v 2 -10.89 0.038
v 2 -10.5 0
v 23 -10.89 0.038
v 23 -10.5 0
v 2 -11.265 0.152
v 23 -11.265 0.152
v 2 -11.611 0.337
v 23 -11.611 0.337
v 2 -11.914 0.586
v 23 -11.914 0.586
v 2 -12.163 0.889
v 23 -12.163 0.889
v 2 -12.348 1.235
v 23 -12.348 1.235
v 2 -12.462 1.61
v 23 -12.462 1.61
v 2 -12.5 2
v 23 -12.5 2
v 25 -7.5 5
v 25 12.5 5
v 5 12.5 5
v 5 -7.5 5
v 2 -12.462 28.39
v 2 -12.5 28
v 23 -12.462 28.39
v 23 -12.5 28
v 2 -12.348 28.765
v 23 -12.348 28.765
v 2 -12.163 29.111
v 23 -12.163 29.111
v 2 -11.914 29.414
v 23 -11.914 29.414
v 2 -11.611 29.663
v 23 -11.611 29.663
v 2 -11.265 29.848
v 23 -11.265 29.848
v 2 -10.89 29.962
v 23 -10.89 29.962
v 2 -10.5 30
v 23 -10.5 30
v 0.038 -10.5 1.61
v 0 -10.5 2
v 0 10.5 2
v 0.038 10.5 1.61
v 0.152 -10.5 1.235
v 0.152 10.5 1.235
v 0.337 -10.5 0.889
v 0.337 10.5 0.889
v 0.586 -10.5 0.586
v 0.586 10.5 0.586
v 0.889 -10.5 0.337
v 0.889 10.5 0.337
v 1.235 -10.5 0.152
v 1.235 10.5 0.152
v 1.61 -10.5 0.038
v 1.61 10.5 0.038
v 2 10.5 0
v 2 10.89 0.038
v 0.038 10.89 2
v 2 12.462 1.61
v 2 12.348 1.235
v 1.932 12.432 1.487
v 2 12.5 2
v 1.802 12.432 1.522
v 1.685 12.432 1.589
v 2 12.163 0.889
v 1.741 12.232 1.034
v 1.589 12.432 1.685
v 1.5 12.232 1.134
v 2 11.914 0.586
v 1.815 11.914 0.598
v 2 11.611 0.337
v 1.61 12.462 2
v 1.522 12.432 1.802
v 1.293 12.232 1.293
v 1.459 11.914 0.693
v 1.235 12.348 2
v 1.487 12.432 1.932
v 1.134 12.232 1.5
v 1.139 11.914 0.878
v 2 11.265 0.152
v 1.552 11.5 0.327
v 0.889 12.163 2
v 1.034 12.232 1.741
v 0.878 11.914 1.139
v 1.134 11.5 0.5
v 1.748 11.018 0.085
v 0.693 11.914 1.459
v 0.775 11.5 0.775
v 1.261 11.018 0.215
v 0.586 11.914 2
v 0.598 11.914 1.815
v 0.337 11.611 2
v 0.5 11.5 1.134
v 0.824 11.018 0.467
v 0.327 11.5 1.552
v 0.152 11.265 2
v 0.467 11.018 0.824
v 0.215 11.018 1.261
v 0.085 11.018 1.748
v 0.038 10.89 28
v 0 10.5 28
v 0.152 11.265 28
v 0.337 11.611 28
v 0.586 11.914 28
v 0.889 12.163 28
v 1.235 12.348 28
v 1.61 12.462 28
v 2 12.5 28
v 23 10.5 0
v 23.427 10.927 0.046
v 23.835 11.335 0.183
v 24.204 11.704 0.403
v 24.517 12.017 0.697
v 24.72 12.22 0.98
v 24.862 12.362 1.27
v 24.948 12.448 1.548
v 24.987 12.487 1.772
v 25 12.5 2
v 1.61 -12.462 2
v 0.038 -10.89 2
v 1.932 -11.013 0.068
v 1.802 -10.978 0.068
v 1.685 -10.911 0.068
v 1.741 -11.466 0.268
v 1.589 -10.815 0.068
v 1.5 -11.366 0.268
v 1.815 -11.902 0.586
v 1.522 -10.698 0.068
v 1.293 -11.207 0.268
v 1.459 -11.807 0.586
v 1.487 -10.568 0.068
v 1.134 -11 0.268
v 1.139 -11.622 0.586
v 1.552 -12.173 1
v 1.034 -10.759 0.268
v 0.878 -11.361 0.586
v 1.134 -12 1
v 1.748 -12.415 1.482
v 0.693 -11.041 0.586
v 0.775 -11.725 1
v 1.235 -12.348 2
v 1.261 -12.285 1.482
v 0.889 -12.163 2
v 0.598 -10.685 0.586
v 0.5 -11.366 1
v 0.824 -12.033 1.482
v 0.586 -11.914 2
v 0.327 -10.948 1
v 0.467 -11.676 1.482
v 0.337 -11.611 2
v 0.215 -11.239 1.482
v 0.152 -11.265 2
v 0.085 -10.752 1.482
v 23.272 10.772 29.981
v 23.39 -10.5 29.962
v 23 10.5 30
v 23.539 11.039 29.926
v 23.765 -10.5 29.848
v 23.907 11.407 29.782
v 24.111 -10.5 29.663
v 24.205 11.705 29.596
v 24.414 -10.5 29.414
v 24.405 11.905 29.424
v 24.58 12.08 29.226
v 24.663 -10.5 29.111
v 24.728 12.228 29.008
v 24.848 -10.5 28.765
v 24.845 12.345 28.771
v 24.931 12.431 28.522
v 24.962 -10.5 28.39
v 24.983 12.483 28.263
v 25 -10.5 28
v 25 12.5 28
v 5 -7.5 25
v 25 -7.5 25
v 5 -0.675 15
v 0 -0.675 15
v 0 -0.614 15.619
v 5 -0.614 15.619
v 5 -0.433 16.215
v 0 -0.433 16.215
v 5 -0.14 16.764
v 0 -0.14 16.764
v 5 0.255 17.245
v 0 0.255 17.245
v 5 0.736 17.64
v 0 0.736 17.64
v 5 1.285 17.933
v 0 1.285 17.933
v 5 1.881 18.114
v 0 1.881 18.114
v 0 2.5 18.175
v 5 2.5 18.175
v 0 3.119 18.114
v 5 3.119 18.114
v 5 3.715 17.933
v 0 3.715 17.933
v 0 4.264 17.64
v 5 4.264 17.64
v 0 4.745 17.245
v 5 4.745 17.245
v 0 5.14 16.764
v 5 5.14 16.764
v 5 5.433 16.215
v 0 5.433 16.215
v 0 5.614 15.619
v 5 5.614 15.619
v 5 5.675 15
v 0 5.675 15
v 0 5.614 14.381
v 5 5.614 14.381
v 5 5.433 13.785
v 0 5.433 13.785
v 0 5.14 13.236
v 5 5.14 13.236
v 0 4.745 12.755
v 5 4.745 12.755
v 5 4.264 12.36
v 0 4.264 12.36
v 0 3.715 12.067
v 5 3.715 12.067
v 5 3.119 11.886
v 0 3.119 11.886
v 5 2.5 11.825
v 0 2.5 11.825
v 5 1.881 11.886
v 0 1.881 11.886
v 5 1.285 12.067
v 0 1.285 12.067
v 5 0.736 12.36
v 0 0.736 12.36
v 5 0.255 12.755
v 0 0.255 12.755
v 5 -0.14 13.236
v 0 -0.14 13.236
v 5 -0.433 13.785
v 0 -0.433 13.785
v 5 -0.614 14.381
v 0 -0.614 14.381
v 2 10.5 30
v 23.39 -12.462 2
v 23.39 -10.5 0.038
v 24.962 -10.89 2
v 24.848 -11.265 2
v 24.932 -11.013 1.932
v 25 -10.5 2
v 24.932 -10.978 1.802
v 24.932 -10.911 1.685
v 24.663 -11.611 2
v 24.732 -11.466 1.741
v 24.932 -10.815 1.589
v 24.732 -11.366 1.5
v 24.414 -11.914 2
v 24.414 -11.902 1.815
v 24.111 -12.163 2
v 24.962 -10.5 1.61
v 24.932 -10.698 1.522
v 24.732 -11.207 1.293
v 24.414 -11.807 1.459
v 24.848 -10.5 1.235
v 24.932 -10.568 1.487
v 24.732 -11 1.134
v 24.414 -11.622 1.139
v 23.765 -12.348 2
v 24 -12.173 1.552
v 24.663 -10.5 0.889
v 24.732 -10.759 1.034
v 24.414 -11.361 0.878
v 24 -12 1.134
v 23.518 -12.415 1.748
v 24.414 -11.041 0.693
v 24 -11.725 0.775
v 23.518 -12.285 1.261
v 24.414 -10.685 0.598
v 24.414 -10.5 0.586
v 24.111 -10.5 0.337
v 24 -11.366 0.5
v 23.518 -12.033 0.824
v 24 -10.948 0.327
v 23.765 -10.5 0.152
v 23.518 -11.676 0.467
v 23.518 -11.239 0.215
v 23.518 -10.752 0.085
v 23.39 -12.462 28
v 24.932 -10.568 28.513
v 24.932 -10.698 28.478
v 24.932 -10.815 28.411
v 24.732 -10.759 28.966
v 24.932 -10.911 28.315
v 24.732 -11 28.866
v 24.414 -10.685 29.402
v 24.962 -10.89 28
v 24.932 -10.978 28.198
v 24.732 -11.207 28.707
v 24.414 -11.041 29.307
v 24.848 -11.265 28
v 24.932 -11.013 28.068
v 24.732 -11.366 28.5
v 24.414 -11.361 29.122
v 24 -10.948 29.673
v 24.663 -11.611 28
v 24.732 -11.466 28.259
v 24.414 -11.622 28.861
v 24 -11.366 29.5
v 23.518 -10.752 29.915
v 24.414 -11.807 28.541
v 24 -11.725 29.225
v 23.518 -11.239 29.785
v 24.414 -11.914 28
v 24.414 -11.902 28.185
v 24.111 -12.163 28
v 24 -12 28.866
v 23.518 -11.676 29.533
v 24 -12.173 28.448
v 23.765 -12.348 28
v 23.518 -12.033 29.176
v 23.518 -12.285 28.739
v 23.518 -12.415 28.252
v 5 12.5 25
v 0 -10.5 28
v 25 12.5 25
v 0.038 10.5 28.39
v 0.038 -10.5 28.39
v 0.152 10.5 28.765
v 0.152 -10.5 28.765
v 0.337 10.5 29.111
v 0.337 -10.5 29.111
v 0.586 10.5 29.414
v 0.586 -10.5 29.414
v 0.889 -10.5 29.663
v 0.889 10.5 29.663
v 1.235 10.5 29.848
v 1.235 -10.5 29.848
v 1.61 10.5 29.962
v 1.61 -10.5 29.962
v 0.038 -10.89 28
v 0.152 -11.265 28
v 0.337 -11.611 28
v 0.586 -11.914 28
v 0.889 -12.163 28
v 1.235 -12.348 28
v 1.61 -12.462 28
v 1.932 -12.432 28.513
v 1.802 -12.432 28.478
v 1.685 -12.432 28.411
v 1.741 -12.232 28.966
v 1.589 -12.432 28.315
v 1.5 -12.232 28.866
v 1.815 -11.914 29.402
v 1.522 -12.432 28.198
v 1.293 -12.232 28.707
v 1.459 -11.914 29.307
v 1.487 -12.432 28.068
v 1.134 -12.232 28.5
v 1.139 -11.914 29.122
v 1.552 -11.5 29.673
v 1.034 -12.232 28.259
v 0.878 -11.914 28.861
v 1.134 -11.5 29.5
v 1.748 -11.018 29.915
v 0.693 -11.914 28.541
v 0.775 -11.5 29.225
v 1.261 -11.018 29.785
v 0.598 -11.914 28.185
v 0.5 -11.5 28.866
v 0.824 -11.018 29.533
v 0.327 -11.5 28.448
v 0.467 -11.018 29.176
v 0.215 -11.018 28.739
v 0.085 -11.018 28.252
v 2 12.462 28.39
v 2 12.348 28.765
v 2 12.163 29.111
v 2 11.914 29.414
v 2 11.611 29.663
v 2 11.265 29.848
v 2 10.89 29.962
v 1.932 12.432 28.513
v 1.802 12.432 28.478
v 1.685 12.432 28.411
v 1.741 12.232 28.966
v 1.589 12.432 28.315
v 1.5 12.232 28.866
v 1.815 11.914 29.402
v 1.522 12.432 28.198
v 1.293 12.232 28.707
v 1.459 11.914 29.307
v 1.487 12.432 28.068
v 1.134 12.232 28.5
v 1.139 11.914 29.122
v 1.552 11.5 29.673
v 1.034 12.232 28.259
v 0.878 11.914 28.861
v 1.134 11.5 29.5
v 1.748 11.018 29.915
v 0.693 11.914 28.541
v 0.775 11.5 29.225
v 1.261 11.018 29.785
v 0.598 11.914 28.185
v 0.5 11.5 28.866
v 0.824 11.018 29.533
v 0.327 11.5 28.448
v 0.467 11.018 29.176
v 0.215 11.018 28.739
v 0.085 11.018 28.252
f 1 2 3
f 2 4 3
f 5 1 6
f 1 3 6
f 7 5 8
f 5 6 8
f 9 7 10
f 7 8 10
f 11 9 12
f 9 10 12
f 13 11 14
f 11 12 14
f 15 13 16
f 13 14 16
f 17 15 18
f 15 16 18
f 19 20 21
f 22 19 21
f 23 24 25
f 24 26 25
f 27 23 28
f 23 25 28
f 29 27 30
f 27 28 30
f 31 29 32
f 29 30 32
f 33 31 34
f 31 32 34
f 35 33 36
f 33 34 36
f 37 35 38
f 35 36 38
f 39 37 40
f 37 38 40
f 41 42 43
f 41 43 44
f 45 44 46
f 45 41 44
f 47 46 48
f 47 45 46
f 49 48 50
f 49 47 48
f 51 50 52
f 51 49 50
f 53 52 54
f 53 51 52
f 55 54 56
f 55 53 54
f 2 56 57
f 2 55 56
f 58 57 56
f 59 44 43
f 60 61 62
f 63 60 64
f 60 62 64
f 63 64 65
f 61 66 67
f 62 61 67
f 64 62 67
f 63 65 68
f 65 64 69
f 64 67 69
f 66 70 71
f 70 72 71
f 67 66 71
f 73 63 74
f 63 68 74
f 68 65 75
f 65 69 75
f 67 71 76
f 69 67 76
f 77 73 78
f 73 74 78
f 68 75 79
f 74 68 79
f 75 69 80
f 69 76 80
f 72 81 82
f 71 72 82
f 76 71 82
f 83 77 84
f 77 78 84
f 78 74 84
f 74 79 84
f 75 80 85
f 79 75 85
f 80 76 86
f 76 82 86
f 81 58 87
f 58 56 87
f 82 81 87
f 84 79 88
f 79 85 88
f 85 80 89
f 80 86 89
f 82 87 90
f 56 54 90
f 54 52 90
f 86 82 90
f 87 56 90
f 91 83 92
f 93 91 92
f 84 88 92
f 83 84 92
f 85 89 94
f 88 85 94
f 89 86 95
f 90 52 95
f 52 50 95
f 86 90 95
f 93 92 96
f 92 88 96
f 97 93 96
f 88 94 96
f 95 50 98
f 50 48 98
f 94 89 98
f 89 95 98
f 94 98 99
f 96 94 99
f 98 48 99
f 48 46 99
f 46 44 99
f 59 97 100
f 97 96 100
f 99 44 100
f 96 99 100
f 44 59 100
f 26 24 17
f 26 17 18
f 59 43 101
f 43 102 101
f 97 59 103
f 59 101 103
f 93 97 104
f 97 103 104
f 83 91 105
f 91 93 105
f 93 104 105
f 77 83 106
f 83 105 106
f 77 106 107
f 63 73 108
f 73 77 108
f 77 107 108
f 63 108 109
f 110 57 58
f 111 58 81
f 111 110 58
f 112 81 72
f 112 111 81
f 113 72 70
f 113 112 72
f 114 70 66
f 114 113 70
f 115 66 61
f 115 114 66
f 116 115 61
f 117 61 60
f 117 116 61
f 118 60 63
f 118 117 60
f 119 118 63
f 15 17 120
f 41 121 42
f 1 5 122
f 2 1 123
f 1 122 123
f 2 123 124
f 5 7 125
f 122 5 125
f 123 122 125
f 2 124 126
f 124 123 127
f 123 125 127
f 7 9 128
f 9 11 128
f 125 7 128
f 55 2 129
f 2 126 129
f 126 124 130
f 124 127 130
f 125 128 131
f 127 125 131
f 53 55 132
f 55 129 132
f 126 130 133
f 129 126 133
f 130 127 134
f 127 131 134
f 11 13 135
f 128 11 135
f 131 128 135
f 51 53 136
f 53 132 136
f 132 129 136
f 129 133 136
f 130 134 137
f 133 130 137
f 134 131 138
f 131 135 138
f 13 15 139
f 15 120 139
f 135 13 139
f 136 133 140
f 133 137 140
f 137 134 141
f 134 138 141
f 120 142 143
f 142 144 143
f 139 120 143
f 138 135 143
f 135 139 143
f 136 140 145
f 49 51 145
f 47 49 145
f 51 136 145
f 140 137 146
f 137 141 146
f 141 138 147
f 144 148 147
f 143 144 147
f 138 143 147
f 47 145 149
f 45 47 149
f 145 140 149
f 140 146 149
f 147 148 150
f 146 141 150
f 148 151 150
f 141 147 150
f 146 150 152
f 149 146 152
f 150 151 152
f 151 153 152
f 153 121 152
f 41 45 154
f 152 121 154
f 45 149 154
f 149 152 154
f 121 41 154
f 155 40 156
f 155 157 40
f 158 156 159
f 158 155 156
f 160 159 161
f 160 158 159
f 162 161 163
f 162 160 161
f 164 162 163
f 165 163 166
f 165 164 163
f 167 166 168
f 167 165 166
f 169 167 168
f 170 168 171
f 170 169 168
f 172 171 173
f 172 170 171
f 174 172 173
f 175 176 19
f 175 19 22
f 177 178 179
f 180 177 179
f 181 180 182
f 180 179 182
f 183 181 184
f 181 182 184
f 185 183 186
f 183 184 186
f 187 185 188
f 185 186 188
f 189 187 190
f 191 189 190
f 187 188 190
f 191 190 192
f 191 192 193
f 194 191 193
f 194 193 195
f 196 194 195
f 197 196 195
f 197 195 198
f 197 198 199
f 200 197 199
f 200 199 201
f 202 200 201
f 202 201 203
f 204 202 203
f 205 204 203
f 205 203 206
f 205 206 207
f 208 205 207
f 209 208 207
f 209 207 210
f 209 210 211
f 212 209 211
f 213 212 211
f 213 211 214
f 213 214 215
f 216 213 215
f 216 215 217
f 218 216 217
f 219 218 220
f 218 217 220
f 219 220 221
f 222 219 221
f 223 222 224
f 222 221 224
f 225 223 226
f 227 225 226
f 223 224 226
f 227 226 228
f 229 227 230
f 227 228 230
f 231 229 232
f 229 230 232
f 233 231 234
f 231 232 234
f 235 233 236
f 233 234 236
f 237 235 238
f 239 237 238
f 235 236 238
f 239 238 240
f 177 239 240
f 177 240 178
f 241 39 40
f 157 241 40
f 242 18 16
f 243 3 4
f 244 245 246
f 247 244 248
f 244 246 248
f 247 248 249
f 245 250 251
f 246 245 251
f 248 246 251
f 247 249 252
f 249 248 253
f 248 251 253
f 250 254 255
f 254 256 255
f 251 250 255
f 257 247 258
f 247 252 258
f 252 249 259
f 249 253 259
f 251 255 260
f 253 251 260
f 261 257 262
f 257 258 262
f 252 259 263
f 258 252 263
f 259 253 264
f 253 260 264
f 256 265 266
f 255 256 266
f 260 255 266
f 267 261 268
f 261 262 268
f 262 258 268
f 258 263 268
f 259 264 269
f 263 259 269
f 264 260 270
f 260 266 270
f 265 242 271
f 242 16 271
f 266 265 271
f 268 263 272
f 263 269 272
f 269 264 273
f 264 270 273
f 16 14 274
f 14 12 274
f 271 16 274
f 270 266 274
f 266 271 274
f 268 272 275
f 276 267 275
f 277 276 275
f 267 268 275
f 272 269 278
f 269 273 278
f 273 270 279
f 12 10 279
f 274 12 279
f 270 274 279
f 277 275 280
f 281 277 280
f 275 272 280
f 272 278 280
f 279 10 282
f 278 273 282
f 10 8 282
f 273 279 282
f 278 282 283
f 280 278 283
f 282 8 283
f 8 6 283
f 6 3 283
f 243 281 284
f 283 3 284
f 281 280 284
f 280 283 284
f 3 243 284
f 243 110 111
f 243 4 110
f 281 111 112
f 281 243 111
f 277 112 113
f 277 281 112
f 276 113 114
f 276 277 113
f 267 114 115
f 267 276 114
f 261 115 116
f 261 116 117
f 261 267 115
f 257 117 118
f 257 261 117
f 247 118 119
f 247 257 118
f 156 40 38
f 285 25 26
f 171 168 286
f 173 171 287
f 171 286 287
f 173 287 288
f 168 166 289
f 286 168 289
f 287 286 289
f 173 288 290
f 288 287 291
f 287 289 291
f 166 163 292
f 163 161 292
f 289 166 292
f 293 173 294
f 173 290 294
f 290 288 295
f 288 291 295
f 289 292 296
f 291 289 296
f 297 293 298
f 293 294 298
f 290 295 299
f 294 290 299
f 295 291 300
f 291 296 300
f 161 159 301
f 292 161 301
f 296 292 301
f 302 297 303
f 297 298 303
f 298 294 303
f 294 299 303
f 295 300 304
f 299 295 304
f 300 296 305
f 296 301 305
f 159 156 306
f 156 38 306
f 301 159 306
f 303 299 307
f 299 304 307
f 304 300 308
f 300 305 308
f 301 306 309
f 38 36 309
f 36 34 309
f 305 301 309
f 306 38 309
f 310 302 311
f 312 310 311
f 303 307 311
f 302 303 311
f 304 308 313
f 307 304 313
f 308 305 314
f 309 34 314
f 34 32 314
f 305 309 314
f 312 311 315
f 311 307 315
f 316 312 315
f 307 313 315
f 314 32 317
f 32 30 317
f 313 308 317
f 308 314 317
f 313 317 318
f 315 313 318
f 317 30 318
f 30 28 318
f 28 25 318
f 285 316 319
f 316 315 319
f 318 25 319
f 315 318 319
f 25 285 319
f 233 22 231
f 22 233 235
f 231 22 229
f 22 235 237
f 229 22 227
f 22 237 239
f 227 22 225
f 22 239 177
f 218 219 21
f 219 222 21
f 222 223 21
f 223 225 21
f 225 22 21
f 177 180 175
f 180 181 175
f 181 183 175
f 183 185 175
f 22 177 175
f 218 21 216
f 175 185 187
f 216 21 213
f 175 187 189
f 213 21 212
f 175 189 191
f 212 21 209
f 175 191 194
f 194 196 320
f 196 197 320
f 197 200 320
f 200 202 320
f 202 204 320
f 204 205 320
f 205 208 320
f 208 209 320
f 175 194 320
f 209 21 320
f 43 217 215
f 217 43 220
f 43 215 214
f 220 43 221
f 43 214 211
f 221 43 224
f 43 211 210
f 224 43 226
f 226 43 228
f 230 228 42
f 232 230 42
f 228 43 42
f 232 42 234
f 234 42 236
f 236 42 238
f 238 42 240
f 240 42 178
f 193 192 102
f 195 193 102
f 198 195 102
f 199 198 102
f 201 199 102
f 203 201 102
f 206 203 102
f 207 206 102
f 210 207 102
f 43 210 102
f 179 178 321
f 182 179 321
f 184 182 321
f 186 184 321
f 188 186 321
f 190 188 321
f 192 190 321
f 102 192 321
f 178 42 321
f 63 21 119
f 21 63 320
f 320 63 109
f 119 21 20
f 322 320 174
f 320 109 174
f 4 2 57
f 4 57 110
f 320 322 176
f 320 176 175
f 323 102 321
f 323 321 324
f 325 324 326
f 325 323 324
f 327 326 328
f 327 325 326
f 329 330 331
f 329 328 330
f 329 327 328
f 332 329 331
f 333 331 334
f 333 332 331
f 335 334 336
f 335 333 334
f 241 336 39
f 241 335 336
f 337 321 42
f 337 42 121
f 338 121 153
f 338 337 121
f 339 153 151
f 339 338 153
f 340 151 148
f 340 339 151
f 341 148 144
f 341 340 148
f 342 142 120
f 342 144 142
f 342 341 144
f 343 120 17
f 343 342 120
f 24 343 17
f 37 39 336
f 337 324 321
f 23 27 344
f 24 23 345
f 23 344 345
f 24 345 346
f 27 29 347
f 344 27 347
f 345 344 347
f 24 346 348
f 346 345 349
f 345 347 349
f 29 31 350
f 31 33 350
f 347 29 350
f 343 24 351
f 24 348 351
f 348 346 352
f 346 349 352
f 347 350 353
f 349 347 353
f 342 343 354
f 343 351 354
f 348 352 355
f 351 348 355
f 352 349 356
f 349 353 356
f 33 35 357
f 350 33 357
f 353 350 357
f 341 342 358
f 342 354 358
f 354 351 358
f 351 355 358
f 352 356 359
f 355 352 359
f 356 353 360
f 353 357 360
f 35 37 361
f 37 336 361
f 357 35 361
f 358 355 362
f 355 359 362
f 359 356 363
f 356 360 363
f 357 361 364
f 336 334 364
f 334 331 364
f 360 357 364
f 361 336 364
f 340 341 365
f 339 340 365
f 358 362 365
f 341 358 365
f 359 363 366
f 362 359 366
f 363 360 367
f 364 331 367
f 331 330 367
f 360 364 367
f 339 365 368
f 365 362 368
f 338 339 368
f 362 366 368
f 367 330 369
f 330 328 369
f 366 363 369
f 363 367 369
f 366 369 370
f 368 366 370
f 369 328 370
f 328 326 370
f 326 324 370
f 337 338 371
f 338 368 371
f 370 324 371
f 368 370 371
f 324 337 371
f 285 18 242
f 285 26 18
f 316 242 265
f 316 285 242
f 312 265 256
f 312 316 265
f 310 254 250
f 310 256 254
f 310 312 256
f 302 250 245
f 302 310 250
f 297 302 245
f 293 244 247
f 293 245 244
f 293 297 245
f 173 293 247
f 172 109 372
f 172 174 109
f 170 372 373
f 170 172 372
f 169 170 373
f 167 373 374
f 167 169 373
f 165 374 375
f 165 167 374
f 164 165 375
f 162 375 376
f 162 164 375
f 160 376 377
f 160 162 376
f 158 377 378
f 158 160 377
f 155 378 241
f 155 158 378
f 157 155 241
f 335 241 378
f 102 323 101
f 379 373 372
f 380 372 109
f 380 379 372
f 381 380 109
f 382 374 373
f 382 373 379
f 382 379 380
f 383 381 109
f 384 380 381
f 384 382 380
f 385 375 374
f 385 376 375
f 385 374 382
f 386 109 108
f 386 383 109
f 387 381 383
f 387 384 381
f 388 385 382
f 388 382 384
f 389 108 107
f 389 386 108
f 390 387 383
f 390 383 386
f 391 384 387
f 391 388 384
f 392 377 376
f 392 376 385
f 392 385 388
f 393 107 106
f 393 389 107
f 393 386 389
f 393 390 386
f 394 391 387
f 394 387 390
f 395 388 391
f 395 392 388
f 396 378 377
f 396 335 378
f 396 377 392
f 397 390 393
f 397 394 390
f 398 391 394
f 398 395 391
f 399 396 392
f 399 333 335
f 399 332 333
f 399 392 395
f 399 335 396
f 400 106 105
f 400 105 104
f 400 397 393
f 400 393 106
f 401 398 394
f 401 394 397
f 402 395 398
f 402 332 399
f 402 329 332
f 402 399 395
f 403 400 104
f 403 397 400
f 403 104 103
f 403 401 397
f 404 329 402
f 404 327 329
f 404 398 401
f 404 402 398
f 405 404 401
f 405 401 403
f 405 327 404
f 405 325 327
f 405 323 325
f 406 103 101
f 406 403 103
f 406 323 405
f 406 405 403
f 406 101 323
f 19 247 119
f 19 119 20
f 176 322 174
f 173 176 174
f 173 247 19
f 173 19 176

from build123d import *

# Parameters (mm, degrees)
F0_W     = 25
F0_H     = 30
F1_DEPTH = 12.5
F2_W     = 20
F2_H     = 20
F3_DEPTH = 20
F4_R     = 3.175
F5_DEPTH = 25.001
F6_R     = 2


with BuildPart() as f1:
    # F0 (on Front) → F1 (new body, symmetric)
    with BuildSketch(Plane.XZ):
        with Locations((12.5, 15)):
            Rectangle(F0_W, F0_H)
    extrude(amount=F1_DEPTH, both=True)

    # F2 (on face) → F3 (cut)
    with BuildSketch(Plane(origin=(0, 12.5, 0), x_dir=(-1, 0, 0), z_dir=(0, 1, 0))):
        with Locations((-15, 15)):
            Rectangle(F2_W, F2_H)
    extrude(amount=-F3_DEPTH, mode=Mode.SUBTRACT)

    # F4 (on face) → F5 (cut, through all)
    with BuildSketch(Plane(origin=(0, 0, 0), x_dir=(0, -1, 0), z_dir=(-1, 0, 0))):
        with Locations((-2.5, 15)):
            Circle(F4_R)
    extrude(amount=-F5_DEPTH, mode=Mode.SUBTRACT)

    # F6
    f6_edges = [f1.edges().sort_by_distance(p)[0] for p in [
        (0, 0, 30),
        (12.5, 12.5, 30),
        (12.5, -12.5, 30),
        (25, 0, 30),
        (0, -12.5, 15),
        (12.5, -12.5, 0),
        (25, -12.5, 15),
        (0, 0, 0),
        (12.5, 12.5, 0),
        (25, 0, 0),
        (0, 12.5, 15),
    ]]
    fillet(f6_edges, radius=F6_R)


solid = f1.part
